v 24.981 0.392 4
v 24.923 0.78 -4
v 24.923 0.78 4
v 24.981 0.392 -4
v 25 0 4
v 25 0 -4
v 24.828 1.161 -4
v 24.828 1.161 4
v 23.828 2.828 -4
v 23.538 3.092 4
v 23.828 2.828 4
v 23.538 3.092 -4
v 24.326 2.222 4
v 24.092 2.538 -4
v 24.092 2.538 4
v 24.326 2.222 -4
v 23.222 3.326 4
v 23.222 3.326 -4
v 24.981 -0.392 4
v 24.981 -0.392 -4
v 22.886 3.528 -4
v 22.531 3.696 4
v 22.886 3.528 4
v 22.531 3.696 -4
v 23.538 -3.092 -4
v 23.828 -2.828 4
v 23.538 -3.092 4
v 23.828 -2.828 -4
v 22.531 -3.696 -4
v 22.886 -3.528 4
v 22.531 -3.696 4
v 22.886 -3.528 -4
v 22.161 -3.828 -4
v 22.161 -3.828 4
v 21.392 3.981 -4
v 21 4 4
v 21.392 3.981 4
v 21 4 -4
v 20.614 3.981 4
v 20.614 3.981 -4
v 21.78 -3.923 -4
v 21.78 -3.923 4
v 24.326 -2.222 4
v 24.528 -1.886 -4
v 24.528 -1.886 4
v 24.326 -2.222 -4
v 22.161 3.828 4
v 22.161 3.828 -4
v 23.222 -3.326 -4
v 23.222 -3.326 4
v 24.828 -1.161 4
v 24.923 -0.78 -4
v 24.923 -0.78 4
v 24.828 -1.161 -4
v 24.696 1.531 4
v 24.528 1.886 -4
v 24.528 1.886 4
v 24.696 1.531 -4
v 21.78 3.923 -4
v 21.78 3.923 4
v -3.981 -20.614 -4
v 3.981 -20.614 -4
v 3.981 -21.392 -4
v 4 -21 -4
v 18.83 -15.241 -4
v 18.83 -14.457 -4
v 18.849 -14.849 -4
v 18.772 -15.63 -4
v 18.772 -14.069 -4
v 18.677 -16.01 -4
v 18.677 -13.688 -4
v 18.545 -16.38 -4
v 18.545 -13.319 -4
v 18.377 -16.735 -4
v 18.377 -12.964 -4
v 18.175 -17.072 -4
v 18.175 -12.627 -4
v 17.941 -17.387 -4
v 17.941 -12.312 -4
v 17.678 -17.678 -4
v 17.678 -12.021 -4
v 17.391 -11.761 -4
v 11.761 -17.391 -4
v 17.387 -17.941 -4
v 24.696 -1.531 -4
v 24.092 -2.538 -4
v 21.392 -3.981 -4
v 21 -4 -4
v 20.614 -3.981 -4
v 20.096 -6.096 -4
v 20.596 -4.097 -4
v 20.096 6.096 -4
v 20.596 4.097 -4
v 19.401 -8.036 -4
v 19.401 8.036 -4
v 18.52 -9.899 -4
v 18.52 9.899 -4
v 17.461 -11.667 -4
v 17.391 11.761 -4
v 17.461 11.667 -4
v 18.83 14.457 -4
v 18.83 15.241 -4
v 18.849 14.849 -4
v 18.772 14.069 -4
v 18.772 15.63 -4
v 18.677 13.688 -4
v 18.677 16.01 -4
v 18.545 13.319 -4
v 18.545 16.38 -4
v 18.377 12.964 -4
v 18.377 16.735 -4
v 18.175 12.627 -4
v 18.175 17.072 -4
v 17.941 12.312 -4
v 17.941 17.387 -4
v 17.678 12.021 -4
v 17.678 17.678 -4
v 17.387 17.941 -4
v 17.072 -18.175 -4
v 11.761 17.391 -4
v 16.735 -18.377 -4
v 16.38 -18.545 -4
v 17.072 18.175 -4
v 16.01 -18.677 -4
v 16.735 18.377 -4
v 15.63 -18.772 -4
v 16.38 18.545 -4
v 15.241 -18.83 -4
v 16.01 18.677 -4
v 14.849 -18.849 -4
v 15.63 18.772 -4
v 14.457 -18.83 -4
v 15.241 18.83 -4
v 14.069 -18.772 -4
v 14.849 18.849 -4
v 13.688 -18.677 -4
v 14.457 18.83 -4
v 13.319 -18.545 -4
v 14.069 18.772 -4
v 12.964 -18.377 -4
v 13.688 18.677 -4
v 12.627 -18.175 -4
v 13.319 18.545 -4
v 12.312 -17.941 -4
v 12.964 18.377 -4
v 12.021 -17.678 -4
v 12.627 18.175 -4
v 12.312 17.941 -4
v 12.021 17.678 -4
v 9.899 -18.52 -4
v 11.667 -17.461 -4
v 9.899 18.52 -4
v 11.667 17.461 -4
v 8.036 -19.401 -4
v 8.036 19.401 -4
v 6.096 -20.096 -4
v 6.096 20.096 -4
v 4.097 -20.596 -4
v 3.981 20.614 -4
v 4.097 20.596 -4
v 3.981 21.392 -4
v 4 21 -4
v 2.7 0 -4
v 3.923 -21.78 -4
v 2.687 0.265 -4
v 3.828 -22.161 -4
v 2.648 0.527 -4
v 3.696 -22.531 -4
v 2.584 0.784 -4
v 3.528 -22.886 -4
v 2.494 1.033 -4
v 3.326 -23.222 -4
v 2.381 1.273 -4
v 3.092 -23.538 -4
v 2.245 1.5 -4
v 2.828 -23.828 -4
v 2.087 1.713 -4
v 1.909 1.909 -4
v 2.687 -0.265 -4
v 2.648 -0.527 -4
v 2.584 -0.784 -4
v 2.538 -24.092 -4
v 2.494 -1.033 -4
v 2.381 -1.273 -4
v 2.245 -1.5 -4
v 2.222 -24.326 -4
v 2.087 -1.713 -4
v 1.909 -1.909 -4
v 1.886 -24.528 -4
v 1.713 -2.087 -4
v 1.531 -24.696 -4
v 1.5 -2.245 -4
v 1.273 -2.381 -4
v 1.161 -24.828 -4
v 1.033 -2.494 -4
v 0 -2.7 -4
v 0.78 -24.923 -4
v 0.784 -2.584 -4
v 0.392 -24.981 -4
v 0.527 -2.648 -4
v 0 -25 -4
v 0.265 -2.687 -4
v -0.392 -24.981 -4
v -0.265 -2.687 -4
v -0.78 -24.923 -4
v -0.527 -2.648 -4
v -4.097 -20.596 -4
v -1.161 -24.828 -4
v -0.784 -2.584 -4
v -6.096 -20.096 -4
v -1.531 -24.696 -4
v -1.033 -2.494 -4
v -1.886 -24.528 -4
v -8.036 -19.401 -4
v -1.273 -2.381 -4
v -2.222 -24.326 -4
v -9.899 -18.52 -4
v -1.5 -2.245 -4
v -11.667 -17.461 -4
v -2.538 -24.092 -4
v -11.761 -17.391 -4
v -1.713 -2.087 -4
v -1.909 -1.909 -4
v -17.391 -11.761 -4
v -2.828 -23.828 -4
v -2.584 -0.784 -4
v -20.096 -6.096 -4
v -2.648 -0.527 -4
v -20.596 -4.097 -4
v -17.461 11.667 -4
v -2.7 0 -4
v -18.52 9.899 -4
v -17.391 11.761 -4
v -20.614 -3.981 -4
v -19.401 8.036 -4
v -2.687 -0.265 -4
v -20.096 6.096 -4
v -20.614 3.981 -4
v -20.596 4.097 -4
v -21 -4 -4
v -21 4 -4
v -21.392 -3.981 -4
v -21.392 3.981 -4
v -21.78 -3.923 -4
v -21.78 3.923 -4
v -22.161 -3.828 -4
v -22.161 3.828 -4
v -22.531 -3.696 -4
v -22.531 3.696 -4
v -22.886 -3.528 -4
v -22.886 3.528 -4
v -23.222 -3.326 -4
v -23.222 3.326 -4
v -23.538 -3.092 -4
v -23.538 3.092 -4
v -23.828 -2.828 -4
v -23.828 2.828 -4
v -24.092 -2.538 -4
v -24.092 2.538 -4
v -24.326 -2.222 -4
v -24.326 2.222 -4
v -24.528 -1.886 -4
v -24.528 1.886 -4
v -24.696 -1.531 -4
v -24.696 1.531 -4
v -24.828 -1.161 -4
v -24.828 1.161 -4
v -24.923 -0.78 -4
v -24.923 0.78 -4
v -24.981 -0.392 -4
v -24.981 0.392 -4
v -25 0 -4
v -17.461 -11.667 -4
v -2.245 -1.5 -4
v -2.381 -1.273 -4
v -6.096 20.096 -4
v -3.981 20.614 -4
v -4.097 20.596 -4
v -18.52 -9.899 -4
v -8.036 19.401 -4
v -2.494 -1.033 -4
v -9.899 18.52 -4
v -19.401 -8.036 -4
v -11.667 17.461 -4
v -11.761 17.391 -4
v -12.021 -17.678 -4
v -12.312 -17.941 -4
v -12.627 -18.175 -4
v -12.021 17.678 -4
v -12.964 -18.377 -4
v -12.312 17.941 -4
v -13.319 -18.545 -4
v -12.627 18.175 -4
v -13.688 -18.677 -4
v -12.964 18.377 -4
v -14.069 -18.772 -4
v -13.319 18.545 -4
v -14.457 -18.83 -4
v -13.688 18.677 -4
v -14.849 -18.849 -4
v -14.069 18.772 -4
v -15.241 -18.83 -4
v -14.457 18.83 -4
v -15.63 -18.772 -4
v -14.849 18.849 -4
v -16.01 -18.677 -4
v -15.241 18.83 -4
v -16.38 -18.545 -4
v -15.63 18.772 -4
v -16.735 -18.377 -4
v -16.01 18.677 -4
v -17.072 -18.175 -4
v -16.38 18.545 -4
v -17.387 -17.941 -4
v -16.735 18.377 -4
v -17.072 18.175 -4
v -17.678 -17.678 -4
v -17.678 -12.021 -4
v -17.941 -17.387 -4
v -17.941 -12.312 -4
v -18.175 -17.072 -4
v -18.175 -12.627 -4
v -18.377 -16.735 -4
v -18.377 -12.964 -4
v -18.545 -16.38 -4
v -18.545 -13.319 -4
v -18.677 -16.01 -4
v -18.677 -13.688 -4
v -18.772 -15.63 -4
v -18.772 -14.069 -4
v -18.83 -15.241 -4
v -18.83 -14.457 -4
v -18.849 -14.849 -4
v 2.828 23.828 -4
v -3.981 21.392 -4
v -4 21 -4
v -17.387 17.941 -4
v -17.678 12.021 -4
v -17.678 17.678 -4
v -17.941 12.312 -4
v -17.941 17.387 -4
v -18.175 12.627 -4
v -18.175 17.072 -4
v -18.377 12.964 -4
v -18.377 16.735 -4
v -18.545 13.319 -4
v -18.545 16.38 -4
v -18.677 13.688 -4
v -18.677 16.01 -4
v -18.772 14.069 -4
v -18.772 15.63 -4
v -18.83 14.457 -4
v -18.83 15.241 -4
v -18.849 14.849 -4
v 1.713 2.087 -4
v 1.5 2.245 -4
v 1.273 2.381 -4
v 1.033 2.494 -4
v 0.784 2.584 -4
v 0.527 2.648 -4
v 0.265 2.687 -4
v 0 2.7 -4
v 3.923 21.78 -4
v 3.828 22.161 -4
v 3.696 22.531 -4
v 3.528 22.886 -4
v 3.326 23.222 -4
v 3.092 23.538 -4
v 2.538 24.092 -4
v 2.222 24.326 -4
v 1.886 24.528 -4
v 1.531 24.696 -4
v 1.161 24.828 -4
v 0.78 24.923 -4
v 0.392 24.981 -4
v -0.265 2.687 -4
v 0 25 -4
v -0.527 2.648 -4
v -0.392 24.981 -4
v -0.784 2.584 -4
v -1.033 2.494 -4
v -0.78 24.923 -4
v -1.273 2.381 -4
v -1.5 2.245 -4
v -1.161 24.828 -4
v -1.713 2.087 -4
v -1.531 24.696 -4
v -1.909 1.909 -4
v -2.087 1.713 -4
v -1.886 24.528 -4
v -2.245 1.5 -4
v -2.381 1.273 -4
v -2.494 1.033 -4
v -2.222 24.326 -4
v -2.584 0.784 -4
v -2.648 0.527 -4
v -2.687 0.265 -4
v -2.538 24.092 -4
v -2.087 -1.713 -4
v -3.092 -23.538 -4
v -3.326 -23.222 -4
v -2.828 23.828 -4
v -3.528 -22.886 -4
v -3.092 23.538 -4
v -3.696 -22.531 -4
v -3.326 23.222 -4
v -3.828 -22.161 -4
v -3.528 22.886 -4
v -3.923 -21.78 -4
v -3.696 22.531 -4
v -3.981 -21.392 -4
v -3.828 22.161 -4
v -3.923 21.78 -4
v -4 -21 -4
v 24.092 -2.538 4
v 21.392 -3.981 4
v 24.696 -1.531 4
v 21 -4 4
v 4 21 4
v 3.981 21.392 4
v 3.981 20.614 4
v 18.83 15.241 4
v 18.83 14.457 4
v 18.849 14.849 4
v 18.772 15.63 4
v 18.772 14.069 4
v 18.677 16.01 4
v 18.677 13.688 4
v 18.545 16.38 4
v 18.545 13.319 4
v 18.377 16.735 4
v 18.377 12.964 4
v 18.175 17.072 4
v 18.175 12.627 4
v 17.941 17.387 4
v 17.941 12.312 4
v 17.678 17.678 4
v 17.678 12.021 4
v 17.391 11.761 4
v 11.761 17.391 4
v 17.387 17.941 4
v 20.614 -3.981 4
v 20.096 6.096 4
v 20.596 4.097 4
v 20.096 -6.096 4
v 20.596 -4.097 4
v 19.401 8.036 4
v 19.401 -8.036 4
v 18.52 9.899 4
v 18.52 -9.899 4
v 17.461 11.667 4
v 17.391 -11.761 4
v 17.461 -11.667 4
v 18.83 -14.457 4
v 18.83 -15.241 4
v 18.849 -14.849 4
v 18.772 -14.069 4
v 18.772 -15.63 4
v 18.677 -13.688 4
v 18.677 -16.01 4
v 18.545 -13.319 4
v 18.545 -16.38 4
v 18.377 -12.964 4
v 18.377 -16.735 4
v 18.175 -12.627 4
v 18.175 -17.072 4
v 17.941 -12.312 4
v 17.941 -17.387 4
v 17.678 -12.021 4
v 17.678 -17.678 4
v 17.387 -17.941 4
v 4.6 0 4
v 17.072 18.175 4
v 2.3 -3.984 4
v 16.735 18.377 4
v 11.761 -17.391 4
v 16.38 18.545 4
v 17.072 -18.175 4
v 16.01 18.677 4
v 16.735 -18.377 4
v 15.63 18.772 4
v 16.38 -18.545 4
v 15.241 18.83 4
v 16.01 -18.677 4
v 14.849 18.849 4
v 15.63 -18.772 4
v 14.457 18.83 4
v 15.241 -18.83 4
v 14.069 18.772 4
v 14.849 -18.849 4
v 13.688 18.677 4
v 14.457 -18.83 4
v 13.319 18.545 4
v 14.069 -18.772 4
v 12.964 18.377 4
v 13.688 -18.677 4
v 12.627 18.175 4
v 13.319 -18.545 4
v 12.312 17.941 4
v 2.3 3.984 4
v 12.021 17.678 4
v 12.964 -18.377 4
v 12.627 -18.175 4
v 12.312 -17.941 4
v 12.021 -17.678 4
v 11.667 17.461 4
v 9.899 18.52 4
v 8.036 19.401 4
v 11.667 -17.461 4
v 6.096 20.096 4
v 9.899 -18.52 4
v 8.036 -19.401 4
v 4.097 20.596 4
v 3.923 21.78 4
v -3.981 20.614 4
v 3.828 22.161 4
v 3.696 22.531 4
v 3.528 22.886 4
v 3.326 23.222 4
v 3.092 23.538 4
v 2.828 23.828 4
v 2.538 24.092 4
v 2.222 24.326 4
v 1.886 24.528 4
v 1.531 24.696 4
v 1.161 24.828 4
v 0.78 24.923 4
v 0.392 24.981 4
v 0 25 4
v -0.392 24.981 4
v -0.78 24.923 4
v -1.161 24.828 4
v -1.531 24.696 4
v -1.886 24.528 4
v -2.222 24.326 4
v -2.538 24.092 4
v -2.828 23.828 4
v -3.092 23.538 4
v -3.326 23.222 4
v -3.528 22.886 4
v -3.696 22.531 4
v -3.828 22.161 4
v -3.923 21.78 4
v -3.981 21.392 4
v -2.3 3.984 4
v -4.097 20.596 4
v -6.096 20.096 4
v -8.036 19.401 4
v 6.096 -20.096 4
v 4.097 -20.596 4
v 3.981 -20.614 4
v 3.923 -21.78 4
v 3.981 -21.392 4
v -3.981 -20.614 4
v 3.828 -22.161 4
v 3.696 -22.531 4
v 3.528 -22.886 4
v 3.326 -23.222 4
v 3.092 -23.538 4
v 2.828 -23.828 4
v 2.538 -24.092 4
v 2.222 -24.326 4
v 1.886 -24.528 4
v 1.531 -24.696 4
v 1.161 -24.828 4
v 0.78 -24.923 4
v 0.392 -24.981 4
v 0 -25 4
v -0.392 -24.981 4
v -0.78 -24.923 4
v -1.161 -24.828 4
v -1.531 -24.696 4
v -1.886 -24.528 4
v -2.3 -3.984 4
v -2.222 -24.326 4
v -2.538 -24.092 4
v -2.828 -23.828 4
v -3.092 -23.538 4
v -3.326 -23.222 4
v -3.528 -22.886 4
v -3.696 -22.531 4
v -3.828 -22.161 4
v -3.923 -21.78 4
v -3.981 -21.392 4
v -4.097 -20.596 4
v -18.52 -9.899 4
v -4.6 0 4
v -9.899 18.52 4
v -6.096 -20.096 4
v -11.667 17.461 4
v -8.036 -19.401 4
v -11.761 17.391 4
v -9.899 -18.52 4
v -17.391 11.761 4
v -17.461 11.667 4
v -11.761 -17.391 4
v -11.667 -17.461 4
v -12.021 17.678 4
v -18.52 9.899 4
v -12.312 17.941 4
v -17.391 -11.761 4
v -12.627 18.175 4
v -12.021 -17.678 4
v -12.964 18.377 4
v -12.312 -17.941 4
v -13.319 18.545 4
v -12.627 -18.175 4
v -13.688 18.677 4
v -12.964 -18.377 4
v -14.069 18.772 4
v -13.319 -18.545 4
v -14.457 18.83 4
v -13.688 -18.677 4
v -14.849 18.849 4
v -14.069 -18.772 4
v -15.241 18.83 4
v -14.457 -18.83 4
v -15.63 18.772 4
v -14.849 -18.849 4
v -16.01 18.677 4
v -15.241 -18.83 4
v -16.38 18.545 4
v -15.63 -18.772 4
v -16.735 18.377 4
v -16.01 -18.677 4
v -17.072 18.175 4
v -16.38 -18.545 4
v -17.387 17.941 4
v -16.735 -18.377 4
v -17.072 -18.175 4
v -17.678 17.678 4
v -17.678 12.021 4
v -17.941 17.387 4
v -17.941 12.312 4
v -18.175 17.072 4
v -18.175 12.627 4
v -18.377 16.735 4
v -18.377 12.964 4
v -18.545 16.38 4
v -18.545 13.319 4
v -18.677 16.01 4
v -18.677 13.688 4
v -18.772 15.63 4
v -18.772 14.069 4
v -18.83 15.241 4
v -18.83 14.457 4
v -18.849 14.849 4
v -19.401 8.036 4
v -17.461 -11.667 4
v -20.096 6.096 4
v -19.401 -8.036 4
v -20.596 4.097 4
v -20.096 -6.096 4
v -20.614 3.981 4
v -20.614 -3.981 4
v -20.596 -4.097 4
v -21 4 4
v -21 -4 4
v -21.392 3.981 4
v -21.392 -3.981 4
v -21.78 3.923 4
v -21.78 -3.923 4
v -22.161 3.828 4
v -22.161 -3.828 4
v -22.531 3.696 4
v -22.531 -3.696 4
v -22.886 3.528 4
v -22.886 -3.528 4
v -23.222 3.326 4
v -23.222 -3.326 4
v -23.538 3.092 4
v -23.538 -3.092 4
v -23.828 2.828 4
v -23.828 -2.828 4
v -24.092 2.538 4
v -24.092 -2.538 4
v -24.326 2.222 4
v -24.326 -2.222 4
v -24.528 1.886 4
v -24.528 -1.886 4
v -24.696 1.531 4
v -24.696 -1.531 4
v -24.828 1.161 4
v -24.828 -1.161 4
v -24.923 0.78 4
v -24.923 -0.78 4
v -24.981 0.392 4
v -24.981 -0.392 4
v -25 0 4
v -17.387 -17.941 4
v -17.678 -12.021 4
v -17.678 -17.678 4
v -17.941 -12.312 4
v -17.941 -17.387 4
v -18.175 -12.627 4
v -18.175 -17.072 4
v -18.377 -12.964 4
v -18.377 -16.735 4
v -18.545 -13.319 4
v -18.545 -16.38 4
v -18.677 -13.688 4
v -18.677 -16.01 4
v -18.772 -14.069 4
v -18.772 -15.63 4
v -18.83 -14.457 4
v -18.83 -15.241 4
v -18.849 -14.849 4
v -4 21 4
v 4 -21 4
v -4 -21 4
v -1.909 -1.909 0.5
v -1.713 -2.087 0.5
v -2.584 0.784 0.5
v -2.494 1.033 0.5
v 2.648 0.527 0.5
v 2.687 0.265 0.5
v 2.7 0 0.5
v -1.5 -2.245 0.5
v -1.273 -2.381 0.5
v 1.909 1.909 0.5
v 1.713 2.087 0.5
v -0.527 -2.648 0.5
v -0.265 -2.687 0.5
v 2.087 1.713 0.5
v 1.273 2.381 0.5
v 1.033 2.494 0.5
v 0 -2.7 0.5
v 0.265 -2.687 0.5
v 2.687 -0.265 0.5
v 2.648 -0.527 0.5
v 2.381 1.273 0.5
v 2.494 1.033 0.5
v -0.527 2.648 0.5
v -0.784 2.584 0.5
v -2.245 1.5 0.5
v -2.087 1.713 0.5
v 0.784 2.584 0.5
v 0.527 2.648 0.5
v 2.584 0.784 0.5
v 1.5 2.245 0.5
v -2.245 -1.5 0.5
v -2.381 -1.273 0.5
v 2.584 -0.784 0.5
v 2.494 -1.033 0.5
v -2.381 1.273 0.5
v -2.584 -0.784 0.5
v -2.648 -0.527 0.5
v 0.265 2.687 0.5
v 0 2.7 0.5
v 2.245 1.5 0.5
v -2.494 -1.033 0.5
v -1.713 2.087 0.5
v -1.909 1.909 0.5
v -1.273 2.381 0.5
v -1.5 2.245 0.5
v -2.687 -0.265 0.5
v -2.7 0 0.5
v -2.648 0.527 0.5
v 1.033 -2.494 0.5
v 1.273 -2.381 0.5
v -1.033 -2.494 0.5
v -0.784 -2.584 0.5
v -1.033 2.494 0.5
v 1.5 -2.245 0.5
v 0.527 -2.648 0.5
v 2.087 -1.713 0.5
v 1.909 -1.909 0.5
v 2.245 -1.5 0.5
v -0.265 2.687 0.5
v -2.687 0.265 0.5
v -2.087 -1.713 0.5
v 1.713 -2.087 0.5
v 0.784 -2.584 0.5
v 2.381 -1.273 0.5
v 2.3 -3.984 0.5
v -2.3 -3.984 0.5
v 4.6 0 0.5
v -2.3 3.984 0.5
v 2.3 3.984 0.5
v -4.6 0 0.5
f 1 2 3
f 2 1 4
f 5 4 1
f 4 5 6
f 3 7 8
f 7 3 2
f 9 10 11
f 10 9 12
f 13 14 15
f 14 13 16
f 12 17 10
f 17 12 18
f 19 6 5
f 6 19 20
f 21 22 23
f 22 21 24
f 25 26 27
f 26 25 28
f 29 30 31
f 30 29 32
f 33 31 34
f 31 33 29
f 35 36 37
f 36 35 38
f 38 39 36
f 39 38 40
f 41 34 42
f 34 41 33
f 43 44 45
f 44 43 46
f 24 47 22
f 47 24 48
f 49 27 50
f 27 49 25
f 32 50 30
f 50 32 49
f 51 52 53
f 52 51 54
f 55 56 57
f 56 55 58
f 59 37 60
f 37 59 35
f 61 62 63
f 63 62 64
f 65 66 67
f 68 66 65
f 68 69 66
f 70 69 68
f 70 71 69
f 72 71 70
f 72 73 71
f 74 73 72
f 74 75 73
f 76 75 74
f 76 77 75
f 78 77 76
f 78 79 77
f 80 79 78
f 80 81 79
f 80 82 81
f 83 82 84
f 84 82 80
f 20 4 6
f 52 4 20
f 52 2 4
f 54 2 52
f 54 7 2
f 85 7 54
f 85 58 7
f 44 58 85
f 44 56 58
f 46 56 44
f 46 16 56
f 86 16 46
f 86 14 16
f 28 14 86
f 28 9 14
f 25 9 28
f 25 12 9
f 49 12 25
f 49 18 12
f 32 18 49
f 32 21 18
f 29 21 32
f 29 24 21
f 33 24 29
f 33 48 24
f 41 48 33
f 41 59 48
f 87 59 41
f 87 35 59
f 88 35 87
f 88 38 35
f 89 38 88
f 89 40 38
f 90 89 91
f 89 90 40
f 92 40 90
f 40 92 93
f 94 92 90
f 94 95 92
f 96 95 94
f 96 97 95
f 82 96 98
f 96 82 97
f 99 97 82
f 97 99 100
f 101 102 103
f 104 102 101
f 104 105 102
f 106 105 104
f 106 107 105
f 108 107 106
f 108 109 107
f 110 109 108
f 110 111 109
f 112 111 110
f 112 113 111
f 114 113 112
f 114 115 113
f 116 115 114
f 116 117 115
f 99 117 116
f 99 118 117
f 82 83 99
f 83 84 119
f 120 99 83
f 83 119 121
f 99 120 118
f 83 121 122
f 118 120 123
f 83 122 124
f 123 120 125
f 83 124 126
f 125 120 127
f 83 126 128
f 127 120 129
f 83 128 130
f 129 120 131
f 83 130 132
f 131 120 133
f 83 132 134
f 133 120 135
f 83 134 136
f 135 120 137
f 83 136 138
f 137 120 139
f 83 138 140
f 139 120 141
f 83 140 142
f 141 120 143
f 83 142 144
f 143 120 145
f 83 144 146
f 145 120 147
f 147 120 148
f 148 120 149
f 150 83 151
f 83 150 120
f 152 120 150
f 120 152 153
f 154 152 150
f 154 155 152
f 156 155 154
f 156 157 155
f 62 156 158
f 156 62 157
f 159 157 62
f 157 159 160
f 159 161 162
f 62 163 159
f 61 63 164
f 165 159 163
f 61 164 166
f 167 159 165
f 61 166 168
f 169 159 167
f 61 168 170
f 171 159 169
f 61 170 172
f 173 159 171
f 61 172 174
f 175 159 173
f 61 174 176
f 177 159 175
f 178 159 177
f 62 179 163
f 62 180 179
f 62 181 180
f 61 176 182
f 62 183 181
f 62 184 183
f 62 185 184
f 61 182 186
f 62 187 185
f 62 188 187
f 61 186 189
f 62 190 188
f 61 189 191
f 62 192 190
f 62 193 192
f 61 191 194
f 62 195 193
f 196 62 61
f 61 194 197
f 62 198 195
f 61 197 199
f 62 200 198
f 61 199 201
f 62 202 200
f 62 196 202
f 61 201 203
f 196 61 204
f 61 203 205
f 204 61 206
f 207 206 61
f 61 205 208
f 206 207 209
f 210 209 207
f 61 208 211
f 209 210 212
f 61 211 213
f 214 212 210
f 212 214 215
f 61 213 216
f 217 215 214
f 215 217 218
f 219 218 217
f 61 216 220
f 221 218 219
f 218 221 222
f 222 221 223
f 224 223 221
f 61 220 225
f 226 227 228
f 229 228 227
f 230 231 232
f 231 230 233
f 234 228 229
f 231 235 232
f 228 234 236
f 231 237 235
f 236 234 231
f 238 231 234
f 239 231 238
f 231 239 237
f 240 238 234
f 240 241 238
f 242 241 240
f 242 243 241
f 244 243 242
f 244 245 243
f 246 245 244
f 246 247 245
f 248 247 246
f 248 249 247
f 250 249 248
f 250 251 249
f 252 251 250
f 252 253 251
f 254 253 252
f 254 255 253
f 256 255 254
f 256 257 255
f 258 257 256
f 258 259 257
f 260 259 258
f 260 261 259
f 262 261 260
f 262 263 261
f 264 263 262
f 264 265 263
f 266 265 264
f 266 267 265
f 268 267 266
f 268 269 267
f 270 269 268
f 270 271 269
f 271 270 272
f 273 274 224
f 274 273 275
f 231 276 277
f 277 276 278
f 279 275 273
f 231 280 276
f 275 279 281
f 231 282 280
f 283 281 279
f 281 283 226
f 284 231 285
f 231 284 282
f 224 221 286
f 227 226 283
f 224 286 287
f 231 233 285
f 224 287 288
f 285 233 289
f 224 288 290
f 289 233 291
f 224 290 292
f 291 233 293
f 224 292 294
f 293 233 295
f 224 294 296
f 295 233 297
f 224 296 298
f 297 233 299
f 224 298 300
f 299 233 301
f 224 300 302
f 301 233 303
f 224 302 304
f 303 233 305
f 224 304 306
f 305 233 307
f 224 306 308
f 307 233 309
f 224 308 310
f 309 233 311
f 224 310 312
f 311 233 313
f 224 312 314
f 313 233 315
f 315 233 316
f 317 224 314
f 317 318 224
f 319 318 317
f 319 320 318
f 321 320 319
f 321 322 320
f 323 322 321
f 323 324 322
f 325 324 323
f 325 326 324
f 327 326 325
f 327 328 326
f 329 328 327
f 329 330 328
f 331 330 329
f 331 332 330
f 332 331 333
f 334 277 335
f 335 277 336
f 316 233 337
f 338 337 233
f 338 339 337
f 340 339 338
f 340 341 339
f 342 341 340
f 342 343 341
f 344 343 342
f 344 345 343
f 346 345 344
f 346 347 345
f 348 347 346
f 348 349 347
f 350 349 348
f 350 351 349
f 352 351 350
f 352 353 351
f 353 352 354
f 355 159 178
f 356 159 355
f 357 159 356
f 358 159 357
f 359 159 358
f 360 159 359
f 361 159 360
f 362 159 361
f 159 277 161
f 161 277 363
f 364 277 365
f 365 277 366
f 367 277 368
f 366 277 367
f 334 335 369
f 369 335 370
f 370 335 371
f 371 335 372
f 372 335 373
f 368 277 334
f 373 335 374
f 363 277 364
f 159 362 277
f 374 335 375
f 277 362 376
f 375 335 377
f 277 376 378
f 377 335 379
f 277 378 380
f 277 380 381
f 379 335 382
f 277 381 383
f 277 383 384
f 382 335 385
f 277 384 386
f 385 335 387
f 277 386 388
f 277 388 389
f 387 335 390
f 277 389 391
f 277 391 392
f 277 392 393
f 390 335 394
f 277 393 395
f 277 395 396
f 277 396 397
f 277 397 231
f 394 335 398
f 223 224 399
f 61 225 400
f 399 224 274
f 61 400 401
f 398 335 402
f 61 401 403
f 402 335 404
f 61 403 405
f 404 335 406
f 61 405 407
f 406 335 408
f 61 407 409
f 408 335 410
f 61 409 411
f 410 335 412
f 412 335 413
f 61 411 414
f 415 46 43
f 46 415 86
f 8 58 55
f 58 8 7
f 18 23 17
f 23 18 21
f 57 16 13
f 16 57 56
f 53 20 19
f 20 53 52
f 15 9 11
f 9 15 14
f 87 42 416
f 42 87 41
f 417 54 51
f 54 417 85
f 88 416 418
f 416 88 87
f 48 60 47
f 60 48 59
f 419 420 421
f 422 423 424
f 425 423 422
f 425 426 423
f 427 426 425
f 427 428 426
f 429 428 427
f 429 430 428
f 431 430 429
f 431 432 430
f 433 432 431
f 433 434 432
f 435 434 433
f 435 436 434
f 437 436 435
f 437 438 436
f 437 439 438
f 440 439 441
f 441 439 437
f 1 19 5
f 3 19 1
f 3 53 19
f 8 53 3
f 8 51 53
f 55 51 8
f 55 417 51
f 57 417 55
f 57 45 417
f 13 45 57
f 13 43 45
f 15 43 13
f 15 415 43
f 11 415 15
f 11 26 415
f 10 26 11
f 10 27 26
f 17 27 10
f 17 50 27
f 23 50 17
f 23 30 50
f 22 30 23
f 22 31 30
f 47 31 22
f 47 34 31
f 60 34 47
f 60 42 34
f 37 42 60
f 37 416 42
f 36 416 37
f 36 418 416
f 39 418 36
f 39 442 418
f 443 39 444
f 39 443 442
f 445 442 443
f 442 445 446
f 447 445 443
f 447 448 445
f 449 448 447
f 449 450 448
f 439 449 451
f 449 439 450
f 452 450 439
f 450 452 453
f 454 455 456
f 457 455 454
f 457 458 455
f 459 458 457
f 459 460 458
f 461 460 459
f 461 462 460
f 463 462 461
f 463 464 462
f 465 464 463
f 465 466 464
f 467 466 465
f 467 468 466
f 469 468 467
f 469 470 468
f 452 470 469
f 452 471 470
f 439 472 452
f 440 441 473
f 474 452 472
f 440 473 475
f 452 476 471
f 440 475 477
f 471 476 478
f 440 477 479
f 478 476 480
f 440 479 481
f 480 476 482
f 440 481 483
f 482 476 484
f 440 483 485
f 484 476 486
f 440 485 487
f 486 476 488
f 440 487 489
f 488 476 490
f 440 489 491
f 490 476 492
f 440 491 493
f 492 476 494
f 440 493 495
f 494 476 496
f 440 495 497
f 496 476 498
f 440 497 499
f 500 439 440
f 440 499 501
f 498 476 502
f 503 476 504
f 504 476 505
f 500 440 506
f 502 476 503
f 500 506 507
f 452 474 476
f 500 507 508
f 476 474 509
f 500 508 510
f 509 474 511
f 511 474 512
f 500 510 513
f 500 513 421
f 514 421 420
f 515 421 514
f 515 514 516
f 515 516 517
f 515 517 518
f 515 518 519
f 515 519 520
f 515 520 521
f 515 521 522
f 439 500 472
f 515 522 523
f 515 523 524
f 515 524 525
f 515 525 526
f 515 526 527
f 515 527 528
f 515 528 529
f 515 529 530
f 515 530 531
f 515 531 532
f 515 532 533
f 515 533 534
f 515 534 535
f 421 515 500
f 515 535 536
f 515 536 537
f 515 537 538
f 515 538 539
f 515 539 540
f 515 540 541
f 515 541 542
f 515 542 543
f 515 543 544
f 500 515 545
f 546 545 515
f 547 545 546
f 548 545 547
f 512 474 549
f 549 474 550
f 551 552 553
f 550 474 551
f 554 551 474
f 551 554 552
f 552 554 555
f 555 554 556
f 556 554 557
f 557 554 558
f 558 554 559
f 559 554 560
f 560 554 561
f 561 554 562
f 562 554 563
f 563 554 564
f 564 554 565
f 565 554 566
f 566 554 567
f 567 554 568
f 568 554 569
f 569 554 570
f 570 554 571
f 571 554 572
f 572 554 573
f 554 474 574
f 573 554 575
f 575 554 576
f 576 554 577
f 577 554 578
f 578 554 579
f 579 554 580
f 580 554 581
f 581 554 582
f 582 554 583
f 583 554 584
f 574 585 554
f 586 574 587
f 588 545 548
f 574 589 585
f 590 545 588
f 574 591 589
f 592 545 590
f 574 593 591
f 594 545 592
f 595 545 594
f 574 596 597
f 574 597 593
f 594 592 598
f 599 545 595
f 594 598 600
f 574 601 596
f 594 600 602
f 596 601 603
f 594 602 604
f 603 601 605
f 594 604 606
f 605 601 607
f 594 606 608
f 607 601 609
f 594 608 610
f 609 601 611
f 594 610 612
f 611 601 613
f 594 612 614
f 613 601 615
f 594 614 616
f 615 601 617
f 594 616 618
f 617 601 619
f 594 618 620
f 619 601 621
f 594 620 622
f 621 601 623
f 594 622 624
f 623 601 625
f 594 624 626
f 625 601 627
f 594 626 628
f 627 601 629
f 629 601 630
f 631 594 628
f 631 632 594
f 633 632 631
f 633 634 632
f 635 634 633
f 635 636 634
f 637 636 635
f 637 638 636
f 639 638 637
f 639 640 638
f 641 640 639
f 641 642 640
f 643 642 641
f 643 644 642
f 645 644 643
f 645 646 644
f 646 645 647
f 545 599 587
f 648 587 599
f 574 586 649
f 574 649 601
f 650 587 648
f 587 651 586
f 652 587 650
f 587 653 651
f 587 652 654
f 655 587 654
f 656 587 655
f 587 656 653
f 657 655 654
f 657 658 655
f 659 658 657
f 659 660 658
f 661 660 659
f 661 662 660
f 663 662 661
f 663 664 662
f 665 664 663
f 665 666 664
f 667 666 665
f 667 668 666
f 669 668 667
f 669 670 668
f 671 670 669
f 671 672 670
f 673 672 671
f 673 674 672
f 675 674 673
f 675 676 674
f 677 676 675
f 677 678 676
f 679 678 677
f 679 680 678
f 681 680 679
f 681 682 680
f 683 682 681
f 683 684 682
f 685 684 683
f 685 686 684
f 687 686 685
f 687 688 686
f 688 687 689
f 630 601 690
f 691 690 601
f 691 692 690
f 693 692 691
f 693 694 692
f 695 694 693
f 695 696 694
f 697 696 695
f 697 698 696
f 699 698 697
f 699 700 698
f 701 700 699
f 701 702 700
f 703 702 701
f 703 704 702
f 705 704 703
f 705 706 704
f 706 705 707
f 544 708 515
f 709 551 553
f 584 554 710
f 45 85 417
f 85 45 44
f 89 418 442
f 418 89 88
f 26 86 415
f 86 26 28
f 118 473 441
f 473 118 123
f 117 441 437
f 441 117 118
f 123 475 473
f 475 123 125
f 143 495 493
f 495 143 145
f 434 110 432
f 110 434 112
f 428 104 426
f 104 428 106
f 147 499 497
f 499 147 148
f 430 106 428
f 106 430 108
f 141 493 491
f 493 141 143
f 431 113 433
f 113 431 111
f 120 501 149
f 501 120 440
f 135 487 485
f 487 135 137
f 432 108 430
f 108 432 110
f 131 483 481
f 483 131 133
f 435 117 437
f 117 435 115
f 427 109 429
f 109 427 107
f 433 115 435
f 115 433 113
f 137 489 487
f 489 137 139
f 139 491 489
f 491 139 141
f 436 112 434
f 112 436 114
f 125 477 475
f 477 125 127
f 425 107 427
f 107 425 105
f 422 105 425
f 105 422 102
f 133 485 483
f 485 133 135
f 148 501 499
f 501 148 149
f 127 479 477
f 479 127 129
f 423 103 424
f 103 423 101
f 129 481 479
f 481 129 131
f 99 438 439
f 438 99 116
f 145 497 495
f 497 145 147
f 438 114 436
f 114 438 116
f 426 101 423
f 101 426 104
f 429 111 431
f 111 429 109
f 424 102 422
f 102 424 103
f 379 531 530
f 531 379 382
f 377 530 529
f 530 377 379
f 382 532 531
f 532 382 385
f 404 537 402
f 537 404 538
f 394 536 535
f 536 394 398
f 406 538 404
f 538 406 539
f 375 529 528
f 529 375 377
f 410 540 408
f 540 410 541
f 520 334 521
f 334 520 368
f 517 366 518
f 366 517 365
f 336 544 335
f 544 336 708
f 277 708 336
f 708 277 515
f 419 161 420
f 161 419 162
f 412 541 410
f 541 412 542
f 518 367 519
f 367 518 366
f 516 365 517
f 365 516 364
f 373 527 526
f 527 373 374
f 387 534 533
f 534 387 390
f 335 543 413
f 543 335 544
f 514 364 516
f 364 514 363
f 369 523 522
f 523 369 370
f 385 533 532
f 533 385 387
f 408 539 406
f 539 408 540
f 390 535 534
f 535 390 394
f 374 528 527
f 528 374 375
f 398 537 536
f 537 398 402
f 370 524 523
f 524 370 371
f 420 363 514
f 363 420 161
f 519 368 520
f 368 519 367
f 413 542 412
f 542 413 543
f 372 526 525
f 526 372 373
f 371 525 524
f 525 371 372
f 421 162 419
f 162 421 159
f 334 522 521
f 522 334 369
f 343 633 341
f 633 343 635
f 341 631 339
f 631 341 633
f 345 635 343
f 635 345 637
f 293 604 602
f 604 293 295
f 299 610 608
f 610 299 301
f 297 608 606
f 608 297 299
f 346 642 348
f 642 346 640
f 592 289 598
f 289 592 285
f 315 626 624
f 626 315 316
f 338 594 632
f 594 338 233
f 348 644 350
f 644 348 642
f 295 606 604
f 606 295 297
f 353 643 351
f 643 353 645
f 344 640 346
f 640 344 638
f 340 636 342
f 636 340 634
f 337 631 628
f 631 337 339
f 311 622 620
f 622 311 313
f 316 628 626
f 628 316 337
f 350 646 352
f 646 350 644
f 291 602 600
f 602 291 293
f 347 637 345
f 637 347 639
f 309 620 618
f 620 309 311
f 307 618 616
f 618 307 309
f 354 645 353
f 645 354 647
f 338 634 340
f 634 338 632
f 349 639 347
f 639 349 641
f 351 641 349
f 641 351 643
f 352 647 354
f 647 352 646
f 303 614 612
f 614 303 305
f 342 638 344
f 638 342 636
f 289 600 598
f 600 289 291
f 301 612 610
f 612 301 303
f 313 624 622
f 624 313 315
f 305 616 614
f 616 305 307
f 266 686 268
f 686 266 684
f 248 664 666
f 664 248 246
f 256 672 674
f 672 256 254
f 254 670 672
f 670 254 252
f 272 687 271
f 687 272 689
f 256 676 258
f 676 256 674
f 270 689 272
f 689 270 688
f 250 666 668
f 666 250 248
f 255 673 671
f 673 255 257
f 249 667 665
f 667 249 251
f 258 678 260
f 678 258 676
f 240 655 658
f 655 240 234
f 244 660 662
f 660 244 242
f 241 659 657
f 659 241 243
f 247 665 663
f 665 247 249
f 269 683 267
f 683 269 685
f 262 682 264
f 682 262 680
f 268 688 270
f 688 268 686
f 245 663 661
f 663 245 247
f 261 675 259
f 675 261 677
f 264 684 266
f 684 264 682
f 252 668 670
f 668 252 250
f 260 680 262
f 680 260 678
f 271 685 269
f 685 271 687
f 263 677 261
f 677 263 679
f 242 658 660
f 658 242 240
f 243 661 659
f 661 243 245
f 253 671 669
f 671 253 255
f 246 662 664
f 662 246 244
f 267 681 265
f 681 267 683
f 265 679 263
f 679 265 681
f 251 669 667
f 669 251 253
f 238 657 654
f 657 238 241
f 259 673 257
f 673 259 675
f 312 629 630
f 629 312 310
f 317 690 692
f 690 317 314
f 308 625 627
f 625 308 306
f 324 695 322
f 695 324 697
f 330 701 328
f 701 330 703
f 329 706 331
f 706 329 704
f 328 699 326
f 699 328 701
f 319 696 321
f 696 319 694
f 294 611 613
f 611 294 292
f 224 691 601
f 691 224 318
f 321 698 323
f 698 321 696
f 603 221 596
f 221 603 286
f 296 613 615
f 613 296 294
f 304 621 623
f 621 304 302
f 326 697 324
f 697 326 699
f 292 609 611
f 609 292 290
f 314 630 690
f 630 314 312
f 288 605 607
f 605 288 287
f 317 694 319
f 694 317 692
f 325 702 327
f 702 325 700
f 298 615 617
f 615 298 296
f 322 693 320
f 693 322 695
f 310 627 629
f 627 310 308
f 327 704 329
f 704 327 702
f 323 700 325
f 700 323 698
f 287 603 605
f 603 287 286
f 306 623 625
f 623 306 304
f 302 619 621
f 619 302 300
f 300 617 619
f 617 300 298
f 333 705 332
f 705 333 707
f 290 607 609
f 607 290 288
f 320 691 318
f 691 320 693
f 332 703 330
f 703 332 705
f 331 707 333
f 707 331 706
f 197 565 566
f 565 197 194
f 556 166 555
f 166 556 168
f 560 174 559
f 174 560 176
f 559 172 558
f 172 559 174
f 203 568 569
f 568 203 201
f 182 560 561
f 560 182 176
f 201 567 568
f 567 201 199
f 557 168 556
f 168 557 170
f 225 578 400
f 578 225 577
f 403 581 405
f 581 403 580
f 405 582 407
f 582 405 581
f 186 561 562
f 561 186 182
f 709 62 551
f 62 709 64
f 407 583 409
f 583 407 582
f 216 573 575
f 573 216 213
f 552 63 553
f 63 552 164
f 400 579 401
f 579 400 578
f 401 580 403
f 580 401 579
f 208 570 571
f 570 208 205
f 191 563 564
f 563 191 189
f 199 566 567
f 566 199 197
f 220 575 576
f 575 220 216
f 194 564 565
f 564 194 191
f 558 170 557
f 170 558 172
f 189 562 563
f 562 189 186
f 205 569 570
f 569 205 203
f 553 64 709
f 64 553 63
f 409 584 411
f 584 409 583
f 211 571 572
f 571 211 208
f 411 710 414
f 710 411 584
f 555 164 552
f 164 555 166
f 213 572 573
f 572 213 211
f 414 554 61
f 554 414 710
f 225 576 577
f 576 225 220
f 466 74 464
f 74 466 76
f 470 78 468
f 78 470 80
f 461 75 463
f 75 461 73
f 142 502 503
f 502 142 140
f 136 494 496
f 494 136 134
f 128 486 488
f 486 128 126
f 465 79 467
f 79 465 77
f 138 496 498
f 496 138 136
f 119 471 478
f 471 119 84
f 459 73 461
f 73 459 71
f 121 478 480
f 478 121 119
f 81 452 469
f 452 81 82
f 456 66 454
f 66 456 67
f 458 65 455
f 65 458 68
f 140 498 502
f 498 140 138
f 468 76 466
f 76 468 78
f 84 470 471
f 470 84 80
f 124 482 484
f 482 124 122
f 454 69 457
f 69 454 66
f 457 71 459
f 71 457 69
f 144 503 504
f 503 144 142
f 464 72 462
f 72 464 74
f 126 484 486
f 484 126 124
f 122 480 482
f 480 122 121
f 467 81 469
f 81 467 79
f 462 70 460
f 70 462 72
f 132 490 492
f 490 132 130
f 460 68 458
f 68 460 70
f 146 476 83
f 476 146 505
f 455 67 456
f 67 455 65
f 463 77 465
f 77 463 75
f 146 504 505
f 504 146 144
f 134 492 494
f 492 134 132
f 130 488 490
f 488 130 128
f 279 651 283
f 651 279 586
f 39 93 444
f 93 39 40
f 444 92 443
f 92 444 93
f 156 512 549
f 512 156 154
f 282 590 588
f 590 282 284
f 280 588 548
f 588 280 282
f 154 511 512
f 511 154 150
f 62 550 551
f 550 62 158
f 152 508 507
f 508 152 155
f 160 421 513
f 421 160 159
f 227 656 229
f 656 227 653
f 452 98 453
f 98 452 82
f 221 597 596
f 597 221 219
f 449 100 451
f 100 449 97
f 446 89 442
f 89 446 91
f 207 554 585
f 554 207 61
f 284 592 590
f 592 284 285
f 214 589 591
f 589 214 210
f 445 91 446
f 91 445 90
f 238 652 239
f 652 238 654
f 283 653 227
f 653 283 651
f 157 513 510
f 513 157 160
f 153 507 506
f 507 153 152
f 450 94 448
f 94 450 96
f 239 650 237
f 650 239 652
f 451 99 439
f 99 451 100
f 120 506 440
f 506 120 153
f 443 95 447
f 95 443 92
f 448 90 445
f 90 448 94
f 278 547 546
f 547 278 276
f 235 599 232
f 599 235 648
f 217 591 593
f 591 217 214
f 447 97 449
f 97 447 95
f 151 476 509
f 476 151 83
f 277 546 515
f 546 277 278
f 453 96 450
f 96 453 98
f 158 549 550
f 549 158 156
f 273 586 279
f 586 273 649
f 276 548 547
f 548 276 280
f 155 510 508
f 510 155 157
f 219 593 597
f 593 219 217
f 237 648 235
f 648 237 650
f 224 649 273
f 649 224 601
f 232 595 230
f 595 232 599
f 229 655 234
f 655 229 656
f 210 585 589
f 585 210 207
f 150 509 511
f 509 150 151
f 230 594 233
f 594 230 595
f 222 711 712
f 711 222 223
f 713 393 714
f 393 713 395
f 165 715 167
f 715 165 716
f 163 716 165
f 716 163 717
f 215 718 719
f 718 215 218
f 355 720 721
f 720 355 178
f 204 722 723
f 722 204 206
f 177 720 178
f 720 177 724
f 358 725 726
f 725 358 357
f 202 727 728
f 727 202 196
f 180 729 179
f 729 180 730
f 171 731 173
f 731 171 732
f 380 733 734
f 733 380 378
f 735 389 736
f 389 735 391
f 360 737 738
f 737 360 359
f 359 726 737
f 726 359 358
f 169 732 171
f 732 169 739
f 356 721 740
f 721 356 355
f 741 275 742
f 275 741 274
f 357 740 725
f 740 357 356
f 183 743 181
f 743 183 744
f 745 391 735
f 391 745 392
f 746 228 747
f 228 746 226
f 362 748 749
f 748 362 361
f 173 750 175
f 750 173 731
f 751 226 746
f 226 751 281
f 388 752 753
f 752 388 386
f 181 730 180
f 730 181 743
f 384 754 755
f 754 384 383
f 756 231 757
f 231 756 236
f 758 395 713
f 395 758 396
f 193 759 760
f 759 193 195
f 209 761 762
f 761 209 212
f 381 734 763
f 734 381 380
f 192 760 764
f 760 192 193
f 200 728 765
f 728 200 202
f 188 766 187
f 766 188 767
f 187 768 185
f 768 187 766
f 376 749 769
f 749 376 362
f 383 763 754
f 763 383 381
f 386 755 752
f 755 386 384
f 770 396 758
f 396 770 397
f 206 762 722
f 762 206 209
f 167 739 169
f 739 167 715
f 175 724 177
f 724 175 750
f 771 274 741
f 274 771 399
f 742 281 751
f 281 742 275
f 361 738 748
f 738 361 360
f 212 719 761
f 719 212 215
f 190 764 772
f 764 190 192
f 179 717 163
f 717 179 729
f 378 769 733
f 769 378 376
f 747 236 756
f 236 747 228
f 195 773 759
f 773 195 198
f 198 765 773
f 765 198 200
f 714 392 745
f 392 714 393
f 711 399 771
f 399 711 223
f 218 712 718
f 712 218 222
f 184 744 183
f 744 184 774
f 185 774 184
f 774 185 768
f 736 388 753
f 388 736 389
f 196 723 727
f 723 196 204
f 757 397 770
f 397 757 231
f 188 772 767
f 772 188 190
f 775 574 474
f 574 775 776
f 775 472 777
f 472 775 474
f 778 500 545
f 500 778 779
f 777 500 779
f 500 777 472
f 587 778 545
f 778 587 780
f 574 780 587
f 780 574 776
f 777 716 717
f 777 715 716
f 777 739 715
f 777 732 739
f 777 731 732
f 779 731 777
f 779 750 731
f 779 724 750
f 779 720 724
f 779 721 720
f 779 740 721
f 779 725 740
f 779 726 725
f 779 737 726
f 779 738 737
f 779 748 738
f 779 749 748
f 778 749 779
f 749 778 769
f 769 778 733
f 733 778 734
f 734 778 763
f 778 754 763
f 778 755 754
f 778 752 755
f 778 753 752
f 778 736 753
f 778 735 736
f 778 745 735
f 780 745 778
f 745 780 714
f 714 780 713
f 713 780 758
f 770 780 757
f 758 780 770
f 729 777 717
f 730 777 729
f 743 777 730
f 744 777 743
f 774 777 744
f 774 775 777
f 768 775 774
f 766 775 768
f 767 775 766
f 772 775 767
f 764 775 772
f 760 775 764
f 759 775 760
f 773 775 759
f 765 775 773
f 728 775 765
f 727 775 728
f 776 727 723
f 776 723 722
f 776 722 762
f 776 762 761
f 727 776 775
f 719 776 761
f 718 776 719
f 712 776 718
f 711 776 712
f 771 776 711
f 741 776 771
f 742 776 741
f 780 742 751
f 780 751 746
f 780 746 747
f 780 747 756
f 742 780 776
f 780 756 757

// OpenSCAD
// 135er Helicopter Controller - collective friction adjuster V1.1
$fn=64;
difference(){
    union(){
        cylinder(h=8,d=42,center=true);
        for(a=[0:45:315])
            rotate([0,0,a]) translate([21,0,0]) cylinder(h=8,d=8,center=true);
    }
    cylinder(h=12,d=5.4,center=true);
    translate([0,0,2.5]) cylinder(h=4,d=9.2,center=true,$fn=6);
}
